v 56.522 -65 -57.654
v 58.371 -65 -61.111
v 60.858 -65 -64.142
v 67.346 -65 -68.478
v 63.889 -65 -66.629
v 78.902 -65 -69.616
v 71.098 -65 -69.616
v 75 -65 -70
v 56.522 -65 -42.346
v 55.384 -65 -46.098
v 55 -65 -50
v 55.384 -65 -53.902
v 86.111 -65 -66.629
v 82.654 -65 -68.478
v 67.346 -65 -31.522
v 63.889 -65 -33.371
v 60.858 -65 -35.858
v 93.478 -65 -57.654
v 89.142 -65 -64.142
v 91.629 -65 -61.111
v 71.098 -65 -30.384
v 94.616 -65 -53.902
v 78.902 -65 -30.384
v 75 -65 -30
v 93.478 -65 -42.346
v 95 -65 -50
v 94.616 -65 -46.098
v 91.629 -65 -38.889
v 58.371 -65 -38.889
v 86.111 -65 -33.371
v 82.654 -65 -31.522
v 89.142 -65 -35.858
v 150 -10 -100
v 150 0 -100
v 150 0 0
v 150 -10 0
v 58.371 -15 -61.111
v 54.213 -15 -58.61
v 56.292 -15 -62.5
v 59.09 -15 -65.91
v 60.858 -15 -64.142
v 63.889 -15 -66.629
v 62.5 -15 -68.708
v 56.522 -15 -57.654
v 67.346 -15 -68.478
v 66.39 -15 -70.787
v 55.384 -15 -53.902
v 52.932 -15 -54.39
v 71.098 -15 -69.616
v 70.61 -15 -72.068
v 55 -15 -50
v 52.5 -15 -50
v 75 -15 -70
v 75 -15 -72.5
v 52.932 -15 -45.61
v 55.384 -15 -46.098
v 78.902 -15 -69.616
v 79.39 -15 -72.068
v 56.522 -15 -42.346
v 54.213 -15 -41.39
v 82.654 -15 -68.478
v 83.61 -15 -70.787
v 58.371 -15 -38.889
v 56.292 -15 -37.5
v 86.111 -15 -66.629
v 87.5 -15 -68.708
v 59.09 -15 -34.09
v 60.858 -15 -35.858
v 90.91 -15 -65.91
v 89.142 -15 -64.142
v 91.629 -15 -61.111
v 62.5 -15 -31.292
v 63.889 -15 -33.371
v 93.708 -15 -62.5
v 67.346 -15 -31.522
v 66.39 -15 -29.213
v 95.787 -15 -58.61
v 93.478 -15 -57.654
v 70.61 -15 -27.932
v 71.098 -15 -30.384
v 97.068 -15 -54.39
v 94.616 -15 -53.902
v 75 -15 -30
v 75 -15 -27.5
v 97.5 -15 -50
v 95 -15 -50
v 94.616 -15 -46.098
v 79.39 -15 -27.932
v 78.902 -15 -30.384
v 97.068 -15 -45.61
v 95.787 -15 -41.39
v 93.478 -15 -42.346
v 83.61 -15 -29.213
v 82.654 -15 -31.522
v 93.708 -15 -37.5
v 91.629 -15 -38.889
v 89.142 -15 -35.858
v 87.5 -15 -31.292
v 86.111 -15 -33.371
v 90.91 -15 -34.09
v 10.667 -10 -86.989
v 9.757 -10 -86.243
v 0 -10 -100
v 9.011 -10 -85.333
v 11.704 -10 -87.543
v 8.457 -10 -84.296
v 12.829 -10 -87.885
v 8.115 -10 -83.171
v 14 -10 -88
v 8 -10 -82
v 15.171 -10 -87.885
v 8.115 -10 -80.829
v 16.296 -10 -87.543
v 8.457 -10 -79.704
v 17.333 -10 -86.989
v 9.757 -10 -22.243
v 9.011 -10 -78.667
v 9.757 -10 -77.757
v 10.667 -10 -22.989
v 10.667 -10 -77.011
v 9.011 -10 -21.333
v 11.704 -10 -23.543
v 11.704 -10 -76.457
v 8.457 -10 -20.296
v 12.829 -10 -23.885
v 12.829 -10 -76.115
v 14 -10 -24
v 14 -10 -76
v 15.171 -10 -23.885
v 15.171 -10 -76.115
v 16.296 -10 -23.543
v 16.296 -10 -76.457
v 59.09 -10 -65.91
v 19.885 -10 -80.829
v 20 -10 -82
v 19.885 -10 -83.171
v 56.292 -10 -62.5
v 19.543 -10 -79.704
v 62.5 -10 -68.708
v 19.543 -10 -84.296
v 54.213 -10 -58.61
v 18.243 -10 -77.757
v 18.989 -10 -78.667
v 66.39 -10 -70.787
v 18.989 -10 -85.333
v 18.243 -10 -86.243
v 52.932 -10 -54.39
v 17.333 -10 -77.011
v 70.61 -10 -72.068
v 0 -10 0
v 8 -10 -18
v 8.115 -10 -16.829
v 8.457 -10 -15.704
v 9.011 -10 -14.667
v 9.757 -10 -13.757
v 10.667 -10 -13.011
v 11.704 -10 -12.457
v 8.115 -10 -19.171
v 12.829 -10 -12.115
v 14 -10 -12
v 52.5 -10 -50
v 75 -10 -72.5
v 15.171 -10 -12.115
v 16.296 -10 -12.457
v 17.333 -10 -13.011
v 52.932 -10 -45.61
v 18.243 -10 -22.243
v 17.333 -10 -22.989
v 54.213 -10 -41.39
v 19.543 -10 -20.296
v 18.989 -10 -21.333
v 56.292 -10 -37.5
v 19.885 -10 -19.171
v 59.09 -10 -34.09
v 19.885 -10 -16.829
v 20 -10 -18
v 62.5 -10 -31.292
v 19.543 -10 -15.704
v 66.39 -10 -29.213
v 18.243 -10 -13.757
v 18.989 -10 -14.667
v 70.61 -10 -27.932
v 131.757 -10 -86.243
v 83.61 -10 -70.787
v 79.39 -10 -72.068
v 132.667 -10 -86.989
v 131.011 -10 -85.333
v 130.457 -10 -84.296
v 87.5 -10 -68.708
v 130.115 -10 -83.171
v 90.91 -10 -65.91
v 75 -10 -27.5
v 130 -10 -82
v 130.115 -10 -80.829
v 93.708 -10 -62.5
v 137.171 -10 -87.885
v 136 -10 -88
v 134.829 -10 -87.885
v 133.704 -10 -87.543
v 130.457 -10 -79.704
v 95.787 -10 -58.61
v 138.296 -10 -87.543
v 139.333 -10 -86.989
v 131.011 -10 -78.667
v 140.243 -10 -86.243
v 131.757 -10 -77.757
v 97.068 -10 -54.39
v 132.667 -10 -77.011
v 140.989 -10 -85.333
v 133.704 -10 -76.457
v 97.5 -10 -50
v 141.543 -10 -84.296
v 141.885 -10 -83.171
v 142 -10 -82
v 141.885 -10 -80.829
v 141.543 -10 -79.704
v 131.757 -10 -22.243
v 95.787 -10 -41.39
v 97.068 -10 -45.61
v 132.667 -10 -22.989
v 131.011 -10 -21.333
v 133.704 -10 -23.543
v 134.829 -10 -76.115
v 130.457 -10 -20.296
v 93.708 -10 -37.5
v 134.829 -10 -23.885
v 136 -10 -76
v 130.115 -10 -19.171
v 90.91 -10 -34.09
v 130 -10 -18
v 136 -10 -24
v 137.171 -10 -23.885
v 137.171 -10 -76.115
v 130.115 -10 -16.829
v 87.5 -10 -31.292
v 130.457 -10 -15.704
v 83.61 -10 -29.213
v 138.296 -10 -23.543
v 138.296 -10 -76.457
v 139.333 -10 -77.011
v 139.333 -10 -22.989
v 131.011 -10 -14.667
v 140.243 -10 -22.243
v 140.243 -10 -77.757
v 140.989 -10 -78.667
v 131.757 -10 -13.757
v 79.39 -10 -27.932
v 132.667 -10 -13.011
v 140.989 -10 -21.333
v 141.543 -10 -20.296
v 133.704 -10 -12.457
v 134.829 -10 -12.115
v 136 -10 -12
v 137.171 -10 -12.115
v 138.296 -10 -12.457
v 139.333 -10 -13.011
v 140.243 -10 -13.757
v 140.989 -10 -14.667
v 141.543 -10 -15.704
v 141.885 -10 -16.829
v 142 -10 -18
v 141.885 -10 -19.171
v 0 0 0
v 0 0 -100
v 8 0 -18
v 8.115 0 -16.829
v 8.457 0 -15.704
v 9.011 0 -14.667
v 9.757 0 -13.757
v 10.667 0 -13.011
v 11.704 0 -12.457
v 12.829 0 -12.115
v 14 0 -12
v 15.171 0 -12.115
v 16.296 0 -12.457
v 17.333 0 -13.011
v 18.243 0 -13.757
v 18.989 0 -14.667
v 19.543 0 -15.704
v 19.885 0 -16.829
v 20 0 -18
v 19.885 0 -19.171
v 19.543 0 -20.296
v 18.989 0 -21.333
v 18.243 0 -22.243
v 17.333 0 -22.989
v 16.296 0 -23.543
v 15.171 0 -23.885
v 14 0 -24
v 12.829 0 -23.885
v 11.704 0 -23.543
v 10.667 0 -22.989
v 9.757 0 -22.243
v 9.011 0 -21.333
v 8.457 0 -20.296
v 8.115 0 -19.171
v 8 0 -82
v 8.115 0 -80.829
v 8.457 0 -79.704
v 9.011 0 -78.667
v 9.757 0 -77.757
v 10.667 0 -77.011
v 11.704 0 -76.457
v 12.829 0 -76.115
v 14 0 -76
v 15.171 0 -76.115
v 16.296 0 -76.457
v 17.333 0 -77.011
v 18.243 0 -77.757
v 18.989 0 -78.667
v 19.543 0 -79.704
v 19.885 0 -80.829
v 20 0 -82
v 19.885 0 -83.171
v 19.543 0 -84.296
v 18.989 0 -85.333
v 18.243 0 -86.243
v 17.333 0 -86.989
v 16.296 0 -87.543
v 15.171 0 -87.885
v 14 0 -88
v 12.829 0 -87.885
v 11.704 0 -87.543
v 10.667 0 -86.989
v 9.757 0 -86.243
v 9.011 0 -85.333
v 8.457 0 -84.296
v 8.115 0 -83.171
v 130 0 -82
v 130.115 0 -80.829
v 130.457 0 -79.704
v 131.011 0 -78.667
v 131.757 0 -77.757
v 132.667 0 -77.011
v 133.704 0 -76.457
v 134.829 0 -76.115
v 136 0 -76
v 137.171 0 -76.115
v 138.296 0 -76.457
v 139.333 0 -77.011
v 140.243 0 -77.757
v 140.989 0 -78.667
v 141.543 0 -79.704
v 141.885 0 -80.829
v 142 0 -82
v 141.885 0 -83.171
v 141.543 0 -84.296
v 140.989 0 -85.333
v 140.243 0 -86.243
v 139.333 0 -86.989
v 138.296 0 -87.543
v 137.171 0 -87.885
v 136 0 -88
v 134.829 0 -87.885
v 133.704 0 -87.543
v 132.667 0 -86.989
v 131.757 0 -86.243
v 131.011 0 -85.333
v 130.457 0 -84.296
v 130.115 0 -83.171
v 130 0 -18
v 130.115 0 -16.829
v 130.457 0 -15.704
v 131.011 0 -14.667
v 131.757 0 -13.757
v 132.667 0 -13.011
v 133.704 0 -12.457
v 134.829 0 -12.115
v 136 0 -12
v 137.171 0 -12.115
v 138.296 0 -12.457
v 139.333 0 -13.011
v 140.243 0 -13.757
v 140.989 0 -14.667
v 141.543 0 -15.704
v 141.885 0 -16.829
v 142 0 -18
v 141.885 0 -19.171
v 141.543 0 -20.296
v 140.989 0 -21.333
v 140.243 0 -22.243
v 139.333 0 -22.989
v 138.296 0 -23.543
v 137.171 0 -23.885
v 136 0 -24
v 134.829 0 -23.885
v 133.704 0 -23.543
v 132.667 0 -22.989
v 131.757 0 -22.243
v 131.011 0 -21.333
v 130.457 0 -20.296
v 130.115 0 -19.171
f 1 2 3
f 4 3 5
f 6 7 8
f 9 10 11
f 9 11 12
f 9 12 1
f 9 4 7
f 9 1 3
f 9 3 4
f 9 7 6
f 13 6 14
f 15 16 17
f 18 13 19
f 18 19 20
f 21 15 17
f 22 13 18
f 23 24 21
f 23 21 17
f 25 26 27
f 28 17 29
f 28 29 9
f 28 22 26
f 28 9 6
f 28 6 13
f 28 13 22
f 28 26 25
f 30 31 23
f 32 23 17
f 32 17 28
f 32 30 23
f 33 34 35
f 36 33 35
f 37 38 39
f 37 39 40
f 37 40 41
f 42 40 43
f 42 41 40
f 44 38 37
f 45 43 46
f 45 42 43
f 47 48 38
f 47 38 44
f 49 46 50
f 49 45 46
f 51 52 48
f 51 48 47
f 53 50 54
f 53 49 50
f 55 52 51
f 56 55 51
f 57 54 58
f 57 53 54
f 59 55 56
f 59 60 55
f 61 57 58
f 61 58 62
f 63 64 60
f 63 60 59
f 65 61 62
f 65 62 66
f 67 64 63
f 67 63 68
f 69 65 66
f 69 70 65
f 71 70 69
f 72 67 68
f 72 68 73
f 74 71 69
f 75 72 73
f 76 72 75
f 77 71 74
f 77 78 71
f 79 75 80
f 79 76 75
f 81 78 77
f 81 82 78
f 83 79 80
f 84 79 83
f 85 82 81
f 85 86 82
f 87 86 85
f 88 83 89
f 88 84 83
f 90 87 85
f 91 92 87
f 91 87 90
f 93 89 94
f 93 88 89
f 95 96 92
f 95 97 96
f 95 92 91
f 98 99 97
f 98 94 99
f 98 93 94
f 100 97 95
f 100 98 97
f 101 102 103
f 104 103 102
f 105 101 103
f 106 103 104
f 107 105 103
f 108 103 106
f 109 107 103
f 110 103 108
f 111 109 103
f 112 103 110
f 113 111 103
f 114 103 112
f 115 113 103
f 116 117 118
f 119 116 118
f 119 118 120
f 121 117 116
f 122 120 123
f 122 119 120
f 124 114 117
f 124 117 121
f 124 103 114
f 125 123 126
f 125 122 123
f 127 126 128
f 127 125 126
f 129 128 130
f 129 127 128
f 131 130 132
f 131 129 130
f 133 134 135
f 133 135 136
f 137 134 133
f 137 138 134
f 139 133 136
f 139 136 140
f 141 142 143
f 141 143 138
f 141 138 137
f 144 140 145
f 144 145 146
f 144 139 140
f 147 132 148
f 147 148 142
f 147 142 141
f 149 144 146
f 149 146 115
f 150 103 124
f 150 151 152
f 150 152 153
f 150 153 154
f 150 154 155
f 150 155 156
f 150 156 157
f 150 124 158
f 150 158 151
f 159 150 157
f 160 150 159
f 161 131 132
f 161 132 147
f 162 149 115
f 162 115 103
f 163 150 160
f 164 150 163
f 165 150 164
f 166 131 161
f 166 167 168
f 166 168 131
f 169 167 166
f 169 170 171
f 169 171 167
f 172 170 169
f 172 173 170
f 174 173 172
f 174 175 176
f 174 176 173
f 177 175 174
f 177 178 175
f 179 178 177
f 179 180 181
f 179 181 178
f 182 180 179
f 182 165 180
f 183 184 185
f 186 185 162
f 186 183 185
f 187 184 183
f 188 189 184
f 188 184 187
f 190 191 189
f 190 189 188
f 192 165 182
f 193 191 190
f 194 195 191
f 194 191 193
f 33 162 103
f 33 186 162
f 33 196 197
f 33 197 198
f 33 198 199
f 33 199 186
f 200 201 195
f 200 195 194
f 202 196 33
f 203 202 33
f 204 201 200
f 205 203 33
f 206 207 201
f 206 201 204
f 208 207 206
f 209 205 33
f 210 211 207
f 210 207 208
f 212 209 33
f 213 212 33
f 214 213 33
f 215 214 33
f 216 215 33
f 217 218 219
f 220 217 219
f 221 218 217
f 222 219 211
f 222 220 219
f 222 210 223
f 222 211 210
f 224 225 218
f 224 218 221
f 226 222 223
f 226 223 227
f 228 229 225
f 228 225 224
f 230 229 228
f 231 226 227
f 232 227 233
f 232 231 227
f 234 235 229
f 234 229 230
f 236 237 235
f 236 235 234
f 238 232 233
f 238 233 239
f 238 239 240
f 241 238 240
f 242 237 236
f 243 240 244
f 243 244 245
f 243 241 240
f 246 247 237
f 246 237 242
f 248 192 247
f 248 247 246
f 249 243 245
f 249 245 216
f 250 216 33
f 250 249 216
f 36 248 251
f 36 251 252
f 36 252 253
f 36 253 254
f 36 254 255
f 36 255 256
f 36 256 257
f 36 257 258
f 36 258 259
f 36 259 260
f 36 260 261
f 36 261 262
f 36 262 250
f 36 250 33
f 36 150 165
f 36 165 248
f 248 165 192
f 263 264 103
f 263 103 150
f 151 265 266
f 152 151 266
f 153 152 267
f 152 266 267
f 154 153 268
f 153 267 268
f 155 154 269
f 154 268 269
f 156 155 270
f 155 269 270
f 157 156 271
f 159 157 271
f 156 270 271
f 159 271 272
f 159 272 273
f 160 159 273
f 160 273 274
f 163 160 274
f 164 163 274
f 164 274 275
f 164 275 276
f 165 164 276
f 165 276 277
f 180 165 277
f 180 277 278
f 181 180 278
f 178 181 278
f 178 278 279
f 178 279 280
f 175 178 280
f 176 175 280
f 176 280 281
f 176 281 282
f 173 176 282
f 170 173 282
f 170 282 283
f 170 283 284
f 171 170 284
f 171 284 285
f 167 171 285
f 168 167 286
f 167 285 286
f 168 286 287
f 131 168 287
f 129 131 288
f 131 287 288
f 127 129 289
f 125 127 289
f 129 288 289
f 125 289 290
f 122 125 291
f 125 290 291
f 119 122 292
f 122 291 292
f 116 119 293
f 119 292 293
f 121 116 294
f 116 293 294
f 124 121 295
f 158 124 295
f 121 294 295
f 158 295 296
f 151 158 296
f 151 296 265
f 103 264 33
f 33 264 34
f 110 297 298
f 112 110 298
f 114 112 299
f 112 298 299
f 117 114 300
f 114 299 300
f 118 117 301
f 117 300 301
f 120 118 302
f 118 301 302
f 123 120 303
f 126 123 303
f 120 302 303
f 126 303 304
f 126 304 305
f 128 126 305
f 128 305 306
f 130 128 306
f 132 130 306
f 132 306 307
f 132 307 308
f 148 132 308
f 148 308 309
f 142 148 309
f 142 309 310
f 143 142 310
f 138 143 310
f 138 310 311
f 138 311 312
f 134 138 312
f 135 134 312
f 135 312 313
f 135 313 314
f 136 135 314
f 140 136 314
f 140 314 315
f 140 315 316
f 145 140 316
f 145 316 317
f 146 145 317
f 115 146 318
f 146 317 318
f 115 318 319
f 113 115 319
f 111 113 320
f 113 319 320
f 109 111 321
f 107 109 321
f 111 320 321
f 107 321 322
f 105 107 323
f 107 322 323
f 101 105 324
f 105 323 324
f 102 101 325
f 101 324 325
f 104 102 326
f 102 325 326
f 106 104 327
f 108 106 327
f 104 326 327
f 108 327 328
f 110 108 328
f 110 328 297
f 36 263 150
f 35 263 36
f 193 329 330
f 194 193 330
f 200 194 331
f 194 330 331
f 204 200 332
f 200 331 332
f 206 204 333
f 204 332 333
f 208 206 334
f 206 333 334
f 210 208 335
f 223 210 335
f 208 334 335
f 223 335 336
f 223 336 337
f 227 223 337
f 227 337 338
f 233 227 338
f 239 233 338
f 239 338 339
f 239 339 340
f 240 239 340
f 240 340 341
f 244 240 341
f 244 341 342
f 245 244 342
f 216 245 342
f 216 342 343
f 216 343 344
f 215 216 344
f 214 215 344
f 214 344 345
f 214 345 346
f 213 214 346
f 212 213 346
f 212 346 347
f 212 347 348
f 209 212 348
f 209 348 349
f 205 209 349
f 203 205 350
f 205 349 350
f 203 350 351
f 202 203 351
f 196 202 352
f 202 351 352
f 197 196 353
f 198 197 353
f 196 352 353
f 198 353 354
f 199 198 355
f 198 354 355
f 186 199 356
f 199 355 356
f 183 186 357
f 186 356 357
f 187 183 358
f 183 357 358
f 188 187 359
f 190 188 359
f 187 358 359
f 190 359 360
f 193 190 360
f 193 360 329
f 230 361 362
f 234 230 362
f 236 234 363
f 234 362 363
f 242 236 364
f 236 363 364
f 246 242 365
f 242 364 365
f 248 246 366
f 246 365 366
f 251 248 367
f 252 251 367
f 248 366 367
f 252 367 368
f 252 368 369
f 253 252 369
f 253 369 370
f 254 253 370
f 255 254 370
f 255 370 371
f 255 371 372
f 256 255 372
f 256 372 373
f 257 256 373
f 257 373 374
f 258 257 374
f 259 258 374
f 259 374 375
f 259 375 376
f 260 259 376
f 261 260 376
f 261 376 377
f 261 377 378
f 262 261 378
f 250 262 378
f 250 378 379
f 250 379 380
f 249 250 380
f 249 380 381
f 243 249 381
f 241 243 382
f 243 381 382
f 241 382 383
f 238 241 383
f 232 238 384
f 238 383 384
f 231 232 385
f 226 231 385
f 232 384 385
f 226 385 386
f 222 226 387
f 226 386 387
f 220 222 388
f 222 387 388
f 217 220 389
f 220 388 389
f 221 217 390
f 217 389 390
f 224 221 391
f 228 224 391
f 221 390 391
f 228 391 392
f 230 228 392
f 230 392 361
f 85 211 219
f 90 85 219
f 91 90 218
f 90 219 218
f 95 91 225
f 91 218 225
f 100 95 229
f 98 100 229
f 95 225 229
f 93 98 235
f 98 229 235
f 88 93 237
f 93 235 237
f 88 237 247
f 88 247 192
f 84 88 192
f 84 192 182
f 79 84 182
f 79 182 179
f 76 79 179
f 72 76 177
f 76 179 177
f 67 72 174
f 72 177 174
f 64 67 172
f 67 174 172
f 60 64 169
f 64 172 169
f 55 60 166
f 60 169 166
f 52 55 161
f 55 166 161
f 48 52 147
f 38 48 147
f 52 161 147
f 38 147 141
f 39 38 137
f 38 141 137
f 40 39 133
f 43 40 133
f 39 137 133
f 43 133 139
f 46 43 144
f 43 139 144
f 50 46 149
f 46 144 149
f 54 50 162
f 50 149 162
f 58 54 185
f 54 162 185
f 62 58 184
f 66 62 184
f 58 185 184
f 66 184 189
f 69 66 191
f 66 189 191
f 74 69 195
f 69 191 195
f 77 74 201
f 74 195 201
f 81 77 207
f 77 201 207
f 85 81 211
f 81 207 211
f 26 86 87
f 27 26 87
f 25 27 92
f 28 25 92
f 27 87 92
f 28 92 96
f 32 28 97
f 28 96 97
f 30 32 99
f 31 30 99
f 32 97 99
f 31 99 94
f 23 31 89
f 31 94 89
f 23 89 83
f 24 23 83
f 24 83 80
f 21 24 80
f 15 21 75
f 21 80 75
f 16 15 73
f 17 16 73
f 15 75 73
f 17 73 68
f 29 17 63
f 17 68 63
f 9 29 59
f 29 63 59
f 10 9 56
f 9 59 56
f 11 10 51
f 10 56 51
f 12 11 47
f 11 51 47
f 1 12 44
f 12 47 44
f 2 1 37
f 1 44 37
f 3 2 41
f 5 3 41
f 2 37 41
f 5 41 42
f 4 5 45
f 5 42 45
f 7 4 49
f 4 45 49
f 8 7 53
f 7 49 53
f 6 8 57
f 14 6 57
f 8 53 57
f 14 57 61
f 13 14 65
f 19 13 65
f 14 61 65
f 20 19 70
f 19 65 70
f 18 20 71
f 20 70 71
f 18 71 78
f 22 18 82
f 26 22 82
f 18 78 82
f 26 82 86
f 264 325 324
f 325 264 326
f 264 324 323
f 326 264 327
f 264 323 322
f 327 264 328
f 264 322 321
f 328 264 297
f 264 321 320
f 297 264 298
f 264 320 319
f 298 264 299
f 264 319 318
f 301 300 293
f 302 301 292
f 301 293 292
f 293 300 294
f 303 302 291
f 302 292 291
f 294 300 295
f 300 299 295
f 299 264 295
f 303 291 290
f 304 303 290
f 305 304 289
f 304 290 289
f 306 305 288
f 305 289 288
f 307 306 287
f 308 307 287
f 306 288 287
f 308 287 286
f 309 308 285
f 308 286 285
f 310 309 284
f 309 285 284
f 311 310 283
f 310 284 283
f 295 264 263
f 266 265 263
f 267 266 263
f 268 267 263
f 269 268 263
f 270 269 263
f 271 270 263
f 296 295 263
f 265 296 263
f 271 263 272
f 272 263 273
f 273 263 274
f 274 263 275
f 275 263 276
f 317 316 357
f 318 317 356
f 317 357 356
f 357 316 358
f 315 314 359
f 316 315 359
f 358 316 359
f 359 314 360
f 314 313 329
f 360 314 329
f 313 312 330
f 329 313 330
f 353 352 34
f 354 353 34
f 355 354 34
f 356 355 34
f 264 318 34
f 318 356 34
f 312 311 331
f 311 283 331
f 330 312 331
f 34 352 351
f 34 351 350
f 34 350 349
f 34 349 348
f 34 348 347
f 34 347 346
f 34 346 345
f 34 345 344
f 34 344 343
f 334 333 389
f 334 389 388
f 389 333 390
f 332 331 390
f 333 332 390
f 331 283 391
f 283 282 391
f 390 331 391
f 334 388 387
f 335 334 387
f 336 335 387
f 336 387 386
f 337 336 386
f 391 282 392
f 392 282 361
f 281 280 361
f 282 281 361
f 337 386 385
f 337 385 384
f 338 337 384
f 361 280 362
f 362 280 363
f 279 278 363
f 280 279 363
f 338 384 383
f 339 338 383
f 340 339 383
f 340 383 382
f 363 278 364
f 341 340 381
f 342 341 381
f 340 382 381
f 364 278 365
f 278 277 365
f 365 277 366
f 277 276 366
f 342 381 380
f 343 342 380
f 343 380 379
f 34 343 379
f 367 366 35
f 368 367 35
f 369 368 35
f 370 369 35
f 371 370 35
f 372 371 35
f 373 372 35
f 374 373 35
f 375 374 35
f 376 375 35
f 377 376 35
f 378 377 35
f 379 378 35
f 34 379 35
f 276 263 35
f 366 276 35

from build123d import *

# Parameters (mm, degrees)
F0_W     = 150
F0_H     = 100
F1_DEPTH = 10
F2_R     = 22.5
F3_DEPTH = 5
F4_R     = 20
F5_DEPTH = 50
F8_D     = 12
F9_D     = 12
F11_D    = 12


with BuildPart() as f1:
    # F0 (on Front) → F1 (new body)
    with BuildSketch(Plane.XZ):
        with Locations((75, -50)):
            Rectangle(F0_W, F0_H)
    extrude(amount=F1_DEPTH)

    # F2 (on face) → F3 (join)
    with BuildSketch(Plane.XZ.offset(10)):
        with Locations((75, -50)):
            Circle(F2_R)
    extrude(amount=F3_DEPTH)

    # F4 (on face) → F5 (join)
    with BuildSketch(Plane.XZ.offset(15)):
        with Locations((75, -50)):
            Circle(F4_R)
    extrude(amount=F5_DEPTH)

    # F8 (through all)
    with Locations(Plane.XZ.offset(10)):
        with Locations((136, -18)):
            Hole(F8_D / 2)

    # F9 (through all)
    with Locations(Plane.XZ.offset(10)):
        with Locations((136, -82)):
            Hole(F9_D / 2)

    # F11 (through all)
    with Locations(Plane.XZ.offset(10)):
        with Locations((14, -82), (14, -18)):
            Hole(F11_D / 2)


solid = f1.part
